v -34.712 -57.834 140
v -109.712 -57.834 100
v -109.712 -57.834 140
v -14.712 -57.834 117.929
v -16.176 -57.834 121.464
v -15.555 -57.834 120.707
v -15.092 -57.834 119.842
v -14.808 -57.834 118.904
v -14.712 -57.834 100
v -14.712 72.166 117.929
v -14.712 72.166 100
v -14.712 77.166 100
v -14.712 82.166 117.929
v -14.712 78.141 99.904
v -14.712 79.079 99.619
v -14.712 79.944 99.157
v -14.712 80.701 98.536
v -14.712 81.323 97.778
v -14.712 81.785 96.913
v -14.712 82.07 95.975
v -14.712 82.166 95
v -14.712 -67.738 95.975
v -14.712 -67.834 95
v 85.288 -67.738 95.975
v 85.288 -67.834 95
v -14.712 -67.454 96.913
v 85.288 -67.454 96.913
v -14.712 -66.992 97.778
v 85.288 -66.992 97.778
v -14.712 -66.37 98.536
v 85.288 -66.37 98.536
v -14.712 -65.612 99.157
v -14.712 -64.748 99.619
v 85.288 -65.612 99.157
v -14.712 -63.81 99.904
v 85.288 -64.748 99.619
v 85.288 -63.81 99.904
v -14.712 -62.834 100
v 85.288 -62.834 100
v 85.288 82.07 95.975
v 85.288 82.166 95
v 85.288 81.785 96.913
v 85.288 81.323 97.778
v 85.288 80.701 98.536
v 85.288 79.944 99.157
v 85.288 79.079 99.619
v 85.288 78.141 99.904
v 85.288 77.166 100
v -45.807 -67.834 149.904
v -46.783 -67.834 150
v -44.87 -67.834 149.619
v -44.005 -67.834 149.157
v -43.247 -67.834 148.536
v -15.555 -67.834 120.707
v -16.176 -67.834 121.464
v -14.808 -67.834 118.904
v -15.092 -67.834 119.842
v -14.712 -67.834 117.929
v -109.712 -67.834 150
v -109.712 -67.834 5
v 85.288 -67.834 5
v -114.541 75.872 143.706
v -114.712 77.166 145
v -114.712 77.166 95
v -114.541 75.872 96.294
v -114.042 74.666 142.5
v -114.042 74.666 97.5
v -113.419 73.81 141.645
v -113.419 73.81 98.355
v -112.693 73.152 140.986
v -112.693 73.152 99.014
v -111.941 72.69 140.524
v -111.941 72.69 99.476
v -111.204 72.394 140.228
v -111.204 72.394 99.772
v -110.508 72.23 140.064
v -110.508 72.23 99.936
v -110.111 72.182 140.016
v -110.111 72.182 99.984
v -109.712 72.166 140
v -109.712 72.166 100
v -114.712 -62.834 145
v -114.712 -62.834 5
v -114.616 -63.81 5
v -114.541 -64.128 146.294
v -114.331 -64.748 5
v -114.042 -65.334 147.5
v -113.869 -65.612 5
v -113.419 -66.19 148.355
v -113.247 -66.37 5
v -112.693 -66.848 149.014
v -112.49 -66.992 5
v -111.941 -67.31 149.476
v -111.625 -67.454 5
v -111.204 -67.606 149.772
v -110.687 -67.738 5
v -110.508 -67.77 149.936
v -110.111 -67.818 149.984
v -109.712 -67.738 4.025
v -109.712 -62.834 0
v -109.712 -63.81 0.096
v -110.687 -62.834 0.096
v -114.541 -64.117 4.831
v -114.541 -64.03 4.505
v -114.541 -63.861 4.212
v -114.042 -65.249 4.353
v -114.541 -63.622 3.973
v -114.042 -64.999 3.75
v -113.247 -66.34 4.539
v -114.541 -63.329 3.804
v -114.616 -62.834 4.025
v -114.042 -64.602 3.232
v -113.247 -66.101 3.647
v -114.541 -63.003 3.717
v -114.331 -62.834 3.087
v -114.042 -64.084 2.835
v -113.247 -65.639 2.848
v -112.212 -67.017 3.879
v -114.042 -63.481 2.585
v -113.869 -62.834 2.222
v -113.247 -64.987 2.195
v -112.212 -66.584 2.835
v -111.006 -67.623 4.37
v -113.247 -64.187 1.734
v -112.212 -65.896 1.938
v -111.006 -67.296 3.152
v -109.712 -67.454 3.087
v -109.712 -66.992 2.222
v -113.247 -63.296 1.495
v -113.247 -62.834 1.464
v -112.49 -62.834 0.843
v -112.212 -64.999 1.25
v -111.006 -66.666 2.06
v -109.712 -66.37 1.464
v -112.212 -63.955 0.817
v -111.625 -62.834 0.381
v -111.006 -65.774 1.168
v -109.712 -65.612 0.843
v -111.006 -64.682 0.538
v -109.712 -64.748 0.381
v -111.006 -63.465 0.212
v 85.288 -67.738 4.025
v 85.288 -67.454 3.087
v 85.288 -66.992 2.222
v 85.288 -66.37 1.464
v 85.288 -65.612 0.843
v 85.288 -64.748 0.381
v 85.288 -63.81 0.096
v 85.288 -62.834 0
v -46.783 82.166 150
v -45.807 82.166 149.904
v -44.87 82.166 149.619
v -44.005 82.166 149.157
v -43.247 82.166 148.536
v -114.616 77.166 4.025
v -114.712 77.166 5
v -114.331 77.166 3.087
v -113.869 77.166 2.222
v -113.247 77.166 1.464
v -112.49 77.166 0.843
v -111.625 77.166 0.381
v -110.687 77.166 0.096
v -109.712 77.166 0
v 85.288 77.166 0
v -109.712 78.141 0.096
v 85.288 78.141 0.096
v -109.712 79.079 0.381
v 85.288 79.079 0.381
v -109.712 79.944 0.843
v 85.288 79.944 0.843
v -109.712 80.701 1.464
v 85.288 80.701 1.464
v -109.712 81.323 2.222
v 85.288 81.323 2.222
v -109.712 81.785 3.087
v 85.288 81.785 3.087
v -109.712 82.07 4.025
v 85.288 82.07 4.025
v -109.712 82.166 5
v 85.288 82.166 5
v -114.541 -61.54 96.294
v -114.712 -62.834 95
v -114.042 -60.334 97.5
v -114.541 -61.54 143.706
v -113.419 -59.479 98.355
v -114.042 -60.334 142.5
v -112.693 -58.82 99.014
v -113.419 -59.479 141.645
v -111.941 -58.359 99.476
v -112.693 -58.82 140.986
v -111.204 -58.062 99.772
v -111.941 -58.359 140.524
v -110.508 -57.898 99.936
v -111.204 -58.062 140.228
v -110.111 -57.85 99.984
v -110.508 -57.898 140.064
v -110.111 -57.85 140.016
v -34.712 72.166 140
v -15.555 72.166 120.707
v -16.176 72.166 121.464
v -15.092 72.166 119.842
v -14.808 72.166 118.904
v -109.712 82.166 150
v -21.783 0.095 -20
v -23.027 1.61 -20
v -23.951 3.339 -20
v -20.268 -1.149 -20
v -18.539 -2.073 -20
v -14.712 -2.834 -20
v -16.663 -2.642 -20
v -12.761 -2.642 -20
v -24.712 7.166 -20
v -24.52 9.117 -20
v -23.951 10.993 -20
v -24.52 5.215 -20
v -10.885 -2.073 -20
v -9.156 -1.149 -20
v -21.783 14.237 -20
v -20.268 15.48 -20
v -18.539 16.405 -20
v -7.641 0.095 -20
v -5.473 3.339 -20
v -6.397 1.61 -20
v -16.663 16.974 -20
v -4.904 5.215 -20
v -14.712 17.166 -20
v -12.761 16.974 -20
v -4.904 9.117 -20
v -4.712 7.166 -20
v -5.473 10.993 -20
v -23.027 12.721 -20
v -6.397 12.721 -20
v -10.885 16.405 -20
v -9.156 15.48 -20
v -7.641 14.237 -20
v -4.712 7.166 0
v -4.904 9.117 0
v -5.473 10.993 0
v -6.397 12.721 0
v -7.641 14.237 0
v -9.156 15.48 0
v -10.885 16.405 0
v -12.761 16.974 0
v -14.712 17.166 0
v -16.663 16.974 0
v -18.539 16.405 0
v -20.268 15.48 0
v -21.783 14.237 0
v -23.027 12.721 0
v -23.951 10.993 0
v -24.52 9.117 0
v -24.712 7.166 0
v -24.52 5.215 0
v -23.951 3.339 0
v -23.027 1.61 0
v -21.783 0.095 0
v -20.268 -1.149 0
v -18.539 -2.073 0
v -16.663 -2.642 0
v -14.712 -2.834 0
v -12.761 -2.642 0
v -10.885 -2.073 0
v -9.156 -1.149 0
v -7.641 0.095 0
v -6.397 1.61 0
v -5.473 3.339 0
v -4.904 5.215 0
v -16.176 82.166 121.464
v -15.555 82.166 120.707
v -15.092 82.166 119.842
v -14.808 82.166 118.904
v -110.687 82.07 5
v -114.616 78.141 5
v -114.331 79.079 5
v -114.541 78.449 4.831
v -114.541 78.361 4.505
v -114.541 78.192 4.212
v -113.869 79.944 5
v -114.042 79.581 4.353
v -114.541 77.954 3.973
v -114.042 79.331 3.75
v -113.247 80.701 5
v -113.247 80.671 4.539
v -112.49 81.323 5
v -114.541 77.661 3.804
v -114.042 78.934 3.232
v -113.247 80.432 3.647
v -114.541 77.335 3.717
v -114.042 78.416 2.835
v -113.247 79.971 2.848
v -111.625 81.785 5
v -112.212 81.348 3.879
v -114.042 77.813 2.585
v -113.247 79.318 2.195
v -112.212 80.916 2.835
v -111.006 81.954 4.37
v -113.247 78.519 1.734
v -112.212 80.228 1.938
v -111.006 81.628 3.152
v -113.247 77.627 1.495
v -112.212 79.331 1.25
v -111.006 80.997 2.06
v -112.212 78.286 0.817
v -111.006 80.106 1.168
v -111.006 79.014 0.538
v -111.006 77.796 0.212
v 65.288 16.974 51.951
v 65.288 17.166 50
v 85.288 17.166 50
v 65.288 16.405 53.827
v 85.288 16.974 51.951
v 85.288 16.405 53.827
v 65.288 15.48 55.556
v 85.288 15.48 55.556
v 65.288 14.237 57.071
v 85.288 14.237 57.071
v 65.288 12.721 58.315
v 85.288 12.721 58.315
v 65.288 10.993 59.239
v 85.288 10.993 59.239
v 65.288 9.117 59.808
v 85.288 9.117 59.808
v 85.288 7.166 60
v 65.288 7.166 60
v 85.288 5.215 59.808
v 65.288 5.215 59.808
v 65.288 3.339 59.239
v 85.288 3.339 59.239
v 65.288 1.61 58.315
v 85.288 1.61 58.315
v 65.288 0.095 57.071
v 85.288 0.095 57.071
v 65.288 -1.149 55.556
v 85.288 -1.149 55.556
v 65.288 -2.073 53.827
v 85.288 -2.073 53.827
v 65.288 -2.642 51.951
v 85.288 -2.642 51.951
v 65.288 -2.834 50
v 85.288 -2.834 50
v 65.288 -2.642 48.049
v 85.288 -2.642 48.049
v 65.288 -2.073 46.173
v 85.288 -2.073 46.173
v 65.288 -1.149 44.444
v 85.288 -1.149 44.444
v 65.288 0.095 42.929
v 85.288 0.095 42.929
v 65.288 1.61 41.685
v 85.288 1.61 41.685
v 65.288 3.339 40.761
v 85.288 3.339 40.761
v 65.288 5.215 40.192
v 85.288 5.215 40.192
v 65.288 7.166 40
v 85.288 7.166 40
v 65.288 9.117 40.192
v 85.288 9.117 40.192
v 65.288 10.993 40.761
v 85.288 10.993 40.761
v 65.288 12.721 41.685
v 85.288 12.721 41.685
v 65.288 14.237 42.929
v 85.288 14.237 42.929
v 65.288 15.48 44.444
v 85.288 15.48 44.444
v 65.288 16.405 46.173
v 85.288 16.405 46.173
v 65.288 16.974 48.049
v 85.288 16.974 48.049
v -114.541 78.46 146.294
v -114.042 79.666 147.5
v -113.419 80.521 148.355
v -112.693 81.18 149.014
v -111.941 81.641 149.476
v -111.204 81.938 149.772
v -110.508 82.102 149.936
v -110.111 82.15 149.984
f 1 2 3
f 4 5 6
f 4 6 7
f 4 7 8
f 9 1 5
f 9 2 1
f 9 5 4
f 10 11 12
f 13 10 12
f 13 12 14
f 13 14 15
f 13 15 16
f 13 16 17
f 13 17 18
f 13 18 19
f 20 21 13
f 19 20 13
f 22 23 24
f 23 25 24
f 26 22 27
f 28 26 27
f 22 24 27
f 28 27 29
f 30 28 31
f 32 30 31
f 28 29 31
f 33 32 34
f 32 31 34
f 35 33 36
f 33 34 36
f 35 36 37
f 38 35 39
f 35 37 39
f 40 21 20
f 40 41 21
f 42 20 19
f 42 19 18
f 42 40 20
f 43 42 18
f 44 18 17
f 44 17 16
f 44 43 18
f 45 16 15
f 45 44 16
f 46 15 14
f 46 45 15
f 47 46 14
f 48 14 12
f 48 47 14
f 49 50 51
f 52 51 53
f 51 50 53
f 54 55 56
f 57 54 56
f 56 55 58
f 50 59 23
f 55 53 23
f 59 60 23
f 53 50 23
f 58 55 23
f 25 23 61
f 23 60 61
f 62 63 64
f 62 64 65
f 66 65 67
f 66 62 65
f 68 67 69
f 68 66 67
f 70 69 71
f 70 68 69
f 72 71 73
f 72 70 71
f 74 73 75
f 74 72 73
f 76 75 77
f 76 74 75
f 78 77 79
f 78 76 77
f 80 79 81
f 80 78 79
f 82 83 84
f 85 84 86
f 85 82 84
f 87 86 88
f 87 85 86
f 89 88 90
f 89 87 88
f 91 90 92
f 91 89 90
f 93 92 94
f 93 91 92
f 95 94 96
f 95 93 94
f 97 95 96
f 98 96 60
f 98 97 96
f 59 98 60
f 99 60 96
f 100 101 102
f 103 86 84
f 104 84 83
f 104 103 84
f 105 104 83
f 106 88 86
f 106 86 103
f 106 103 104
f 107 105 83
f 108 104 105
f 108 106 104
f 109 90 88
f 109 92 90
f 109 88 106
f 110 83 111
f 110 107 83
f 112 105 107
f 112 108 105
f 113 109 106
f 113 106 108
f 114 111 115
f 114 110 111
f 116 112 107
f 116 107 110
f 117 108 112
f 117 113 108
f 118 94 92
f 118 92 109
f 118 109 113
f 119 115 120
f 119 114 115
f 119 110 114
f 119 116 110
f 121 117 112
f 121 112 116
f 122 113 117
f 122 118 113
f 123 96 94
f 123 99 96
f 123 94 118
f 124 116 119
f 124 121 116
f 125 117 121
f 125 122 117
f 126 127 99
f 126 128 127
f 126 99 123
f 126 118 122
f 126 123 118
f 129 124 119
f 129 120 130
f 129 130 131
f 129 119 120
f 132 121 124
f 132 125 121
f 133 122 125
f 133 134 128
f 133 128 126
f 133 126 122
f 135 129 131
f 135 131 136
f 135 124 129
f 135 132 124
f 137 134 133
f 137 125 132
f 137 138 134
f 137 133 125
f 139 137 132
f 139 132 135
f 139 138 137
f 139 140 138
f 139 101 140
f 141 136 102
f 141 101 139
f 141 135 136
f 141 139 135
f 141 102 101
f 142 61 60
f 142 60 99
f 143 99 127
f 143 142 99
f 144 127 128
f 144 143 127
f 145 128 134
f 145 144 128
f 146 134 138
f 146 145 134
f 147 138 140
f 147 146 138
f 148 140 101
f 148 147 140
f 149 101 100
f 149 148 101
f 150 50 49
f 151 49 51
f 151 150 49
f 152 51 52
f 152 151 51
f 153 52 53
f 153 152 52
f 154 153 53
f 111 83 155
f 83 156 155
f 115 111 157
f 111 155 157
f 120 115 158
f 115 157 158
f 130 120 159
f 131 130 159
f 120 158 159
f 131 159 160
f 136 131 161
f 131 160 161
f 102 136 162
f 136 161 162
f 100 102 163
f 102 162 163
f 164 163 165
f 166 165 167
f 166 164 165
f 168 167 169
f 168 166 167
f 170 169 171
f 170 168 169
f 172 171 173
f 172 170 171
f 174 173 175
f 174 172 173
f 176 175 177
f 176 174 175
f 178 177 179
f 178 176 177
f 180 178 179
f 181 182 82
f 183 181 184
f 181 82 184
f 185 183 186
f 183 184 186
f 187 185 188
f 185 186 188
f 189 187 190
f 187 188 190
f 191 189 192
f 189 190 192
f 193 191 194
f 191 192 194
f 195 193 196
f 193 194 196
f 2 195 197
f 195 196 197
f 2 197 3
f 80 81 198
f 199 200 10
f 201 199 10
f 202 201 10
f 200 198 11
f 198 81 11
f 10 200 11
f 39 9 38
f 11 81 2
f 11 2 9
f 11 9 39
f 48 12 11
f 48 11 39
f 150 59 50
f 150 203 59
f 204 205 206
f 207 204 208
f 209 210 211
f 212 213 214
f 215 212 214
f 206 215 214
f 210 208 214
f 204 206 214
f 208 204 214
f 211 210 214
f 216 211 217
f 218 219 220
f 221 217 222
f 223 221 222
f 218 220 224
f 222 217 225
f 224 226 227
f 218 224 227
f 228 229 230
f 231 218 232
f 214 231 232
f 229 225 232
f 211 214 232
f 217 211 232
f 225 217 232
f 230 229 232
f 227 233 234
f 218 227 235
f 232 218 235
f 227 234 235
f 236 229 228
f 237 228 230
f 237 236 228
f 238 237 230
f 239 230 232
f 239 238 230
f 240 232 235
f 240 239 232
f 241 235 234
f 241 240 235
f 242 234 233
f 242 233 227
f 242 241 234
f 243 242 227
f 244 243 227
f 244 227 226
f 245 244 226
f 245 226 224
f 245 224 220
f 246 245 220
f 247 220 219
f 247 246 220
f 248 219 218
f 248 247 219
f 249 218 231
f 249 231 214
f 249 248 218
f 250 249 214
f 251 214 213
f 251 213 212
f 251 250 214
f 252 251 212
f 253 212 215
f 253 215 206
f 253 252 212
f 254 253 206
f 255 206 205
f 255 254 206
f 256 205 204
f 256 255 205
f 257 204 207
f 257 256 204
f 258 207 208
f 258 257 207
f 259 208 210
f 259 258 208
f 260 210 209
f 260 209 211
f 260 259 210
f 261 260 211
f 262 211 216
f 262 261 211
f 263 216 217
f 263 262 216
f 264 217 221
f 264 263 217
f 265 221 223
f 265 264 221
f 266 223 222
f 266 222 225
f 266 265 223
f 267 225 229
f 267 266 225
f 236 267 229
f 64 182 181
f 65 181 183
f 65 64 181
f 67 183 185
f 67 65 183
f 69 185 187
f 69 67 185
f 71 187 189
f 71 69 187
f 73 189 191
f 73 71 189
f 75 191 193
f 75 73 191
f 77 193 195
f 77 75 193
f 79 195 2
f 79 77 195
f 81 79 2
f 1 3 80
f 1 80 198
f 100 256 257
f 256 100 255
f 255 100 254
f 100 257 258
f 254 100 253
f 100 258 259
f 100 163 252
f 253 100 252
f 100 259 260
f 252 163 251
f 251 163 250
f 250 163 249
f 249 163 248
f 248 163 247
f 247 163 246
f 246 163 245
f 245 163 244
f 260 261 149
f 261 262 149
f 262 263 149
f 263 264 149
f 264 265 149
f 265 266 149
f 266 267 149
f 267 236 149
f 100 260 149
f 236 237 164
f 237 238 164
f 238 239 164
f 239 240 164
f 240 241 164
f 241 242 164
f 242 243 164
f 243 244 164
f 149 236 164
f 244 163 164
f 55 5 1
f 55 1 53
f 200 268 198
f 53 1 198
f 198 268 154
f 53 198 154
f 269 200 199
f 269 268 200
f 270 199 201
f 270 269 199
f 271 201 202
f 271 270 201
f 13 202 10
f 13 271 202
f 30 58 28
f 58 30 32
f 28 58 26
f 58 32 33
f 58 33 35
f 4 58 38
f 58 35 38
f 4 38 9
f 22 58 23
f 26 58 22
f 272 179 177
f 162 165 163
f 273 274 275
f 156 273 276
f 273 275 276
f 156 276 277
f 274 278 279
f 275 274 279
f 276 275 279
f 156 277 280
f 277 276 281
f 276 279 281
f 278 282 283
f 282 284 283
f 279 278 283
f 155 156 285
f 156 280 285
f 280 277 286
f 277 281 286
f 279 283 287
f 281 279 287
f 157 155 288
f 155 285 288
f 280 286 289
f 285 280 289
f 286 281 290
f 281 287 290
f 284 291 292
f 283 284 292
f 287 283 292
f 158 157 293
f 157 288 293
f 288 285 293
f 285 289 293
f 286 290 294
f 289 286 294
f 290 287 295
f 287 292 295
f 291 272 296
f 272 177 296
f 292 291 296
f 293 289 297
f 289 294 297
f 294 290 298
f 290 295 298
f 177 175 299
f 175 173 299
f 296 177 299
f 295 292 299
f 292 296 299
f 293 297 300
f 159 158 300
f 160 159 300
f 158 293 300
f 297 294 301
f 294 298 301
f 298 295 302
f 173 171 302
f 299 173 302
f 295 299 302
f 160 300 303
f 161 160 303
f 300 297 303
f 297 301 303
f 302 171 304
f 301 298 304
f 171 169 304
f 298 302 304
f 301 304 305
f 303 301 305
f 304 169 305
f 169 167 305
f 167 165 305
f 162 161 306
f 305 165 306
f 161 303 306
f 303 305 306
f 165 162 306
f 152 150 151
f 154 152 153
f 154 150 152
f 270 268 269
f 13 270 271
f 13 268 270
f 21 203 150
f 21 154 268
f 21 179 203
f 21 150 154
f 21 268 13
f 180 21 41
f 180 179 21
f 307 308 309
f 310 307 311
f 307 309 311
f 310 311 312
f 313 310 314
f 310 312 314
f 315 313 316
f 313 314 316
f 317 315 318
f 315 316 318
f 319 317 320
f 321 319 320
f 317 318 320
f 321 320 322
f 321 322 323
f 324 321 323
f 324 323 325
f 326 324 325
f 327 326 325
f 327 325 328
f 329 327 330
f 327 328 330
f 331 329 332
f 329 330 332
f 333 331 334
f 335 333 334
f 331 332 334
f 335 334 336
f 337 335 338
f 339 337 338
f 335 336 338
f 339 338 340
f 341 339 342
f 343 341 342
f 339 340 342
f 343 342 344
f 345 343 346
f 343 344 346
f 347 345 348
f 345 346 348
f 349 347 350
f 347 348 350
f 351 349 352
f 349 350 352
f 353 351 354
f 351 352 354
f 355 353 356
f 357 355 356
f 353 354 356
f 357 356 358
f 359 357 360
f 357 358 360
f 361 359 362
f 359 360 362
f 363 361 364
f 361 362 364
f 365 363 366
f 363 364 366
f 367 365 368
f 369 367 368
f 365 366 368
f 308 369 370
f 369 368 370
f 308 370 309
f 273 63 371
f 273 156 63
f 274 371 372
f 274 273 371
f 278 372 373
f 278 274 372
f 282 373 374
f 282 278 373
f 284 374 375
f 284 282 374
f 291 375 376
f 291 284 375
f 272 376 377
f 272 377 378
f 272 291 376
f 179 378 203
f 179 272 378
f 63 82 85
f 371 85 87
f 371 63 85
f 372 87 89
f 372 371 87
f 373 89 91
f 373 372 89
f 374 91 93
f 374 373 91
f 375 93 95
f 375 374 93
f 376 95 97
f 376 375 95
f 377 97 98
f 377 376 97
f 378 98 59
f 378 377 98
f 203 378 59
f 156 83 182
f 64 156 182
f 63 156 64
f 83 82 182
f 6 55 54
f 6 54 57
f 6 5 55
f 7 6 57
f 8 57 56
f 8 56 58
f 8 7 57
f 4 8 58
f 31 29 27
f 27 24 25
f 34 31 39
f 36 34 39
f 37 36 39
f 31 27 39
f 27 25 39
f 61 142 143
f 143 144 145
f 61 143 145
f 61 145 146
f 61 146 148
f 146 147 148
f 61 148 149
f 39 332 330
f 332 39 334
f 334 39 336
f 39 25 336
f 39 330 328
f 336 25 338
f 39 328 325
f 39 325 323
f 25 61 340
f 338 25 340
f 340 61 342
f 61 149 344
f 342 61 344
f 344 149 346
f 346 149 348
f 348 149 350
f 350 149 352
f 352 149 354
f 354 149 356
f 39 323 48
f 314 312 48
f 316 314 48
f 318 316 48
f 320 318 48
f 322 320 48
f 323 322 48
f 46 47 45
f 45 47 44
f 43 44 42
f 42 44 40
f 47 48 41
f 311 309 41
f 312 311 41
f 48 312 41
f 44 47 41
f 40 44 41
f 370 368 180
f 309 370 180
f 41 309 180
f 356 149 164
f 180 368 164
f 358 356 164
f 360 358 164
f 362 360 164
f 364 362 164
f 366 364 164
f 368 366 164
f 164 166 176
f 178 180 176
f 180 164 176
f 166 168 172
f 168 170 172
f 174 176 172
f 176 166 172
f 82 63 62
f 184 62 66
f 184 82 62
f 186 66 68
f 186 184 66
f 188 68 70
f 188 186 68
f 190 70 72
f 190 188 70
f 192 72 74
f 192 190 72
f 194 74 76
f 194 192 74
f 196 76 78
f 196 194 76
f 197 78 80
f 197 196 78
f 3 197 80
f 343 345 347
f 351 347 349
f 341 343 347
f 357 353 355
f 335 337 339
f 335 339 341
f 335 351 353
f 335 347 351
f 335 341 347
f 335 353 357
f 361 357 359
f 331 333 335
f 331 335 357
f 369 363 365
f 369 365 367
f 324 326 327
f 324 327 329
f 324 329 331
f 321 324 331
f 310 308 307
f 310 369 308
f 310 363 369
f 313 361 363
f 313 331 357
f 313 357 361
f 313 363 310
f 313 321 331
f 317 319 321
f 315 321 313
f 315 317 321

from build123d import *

# Parameters (mm, degrees)
F0_W      = 200
F0_H      = 150
F0_R      = 10
F1_DEPTH  = 100
F2_DEPTH  = 20
F3_W      = 100
F3_H      = 10
F4_DEPTH  = 50
F5_SIZE   = 30
F6_W      = 70
F6_H      = 10
F7_DEPTH  = 130
F8_R      = 4.99999
F9_R      = 10
F10_DEPTH = 20


# Not quite as in the source:
# - a fillet or chamfer is up to 0.001 mm smaller than in the source, because OpenCascade refuses the exact size


with BuildPart() as f1:
    # F0 (on Top) → F1 (new body)
    with BuildSketch(Plane.XY):
        with Locations((-14.7118499619, 7.1657538414)):
            Rectangle(F0_W, F0_H)
        with Locations((-14.7118499619, 7.1657538414)):
            Circle(F0_R, mode=Mode.SUBTRACT)
        with Locations((-14.7118499619, 7.1657538414)):
            Circle(F0_R)
    extrude(amount=F1_DEPTH)

    # F0 (on Top) → F2 (join)
    with BuildSketch(Plane.XY):
        with Locations((-14.7118499619, 7.1657538414)):
            Circle(F0_R)
    extrude(amount=-F2_DEPTH)

    # F3 (on face) → F4 (join)
    with BuildSketch(Plane.XY.offset(100)):
        with Locations((-64.7118499619, 77.1657538414)):
            Rectangle(F3_W, F3_H)
        with Locations((-64.7118499619, -62.8342461586)):
            Rectangle(F3_W, F3_H)
    extrude(amount=F4_DEPTH)

    # F5
    f5_edges = [f1.edges().sort_by_distance(p)[0] for p in [
        (-14.71185, -62.834246, 150),
        (-14.71185, 77.165754, 150),
    ]]
    chamfer(f5_edges, length=F5_SIZE)

    # F6 (on face) → F7 (join)
    with BuildSketch(Plane.XZ.offset(-72.1657538414)):
        with Locations((-79.7118499619, 145)):
            Rectangle(F6_W, F6_H)
        Polygon((-34.7118499619, 140), (-44.7118499619, 150), (-44.7118499619, 140), align=None)
    extrude(amount=F7_DEPTH)

    # F8 (radius 5 in the source; OpenCascade refuses exactly that, so slightly less here)
    f8_edges = [f1.edges().sort_by_distance(p)[0] for p in [
        (35.28815, 82.165754, 100),
        (35.28815, -67.834246, 100),
        (-14.71185, 82.165754, 0),
        (-14.71185, -67.834246, 0),
        (-114.71185, 82.165754, 75),
        (-114.71185, 7.165754, 150),
        (-114.71185, -67.834246, 75),
        (-114.71185, 7.165754, 0),
        (-114.71185, 72.165754, 120),
        (-114.71185, 7.165754, 100),
        (-114.71185, -57.834246, 120),
        (-114.71185, 7.165754, 140),
        (-14.71185, -62.834246, 120),
        (-44.71185, 7.165754, 150),
        (-14.71185, 77.165754, 120),
    ]]
    fillet(f8_edges, radius=F8_R)

    # F9 (on face) → F10 (cut)
    with BuildSketch(Plane.YZ.offset(85.2881500381)):
        with Locations((7.1657538414, 50)):
            Circle(F9_R)
    extrude(amount=-F10_DEPTH, mode=Mode.SUBTRACT)


solid = f1.part
